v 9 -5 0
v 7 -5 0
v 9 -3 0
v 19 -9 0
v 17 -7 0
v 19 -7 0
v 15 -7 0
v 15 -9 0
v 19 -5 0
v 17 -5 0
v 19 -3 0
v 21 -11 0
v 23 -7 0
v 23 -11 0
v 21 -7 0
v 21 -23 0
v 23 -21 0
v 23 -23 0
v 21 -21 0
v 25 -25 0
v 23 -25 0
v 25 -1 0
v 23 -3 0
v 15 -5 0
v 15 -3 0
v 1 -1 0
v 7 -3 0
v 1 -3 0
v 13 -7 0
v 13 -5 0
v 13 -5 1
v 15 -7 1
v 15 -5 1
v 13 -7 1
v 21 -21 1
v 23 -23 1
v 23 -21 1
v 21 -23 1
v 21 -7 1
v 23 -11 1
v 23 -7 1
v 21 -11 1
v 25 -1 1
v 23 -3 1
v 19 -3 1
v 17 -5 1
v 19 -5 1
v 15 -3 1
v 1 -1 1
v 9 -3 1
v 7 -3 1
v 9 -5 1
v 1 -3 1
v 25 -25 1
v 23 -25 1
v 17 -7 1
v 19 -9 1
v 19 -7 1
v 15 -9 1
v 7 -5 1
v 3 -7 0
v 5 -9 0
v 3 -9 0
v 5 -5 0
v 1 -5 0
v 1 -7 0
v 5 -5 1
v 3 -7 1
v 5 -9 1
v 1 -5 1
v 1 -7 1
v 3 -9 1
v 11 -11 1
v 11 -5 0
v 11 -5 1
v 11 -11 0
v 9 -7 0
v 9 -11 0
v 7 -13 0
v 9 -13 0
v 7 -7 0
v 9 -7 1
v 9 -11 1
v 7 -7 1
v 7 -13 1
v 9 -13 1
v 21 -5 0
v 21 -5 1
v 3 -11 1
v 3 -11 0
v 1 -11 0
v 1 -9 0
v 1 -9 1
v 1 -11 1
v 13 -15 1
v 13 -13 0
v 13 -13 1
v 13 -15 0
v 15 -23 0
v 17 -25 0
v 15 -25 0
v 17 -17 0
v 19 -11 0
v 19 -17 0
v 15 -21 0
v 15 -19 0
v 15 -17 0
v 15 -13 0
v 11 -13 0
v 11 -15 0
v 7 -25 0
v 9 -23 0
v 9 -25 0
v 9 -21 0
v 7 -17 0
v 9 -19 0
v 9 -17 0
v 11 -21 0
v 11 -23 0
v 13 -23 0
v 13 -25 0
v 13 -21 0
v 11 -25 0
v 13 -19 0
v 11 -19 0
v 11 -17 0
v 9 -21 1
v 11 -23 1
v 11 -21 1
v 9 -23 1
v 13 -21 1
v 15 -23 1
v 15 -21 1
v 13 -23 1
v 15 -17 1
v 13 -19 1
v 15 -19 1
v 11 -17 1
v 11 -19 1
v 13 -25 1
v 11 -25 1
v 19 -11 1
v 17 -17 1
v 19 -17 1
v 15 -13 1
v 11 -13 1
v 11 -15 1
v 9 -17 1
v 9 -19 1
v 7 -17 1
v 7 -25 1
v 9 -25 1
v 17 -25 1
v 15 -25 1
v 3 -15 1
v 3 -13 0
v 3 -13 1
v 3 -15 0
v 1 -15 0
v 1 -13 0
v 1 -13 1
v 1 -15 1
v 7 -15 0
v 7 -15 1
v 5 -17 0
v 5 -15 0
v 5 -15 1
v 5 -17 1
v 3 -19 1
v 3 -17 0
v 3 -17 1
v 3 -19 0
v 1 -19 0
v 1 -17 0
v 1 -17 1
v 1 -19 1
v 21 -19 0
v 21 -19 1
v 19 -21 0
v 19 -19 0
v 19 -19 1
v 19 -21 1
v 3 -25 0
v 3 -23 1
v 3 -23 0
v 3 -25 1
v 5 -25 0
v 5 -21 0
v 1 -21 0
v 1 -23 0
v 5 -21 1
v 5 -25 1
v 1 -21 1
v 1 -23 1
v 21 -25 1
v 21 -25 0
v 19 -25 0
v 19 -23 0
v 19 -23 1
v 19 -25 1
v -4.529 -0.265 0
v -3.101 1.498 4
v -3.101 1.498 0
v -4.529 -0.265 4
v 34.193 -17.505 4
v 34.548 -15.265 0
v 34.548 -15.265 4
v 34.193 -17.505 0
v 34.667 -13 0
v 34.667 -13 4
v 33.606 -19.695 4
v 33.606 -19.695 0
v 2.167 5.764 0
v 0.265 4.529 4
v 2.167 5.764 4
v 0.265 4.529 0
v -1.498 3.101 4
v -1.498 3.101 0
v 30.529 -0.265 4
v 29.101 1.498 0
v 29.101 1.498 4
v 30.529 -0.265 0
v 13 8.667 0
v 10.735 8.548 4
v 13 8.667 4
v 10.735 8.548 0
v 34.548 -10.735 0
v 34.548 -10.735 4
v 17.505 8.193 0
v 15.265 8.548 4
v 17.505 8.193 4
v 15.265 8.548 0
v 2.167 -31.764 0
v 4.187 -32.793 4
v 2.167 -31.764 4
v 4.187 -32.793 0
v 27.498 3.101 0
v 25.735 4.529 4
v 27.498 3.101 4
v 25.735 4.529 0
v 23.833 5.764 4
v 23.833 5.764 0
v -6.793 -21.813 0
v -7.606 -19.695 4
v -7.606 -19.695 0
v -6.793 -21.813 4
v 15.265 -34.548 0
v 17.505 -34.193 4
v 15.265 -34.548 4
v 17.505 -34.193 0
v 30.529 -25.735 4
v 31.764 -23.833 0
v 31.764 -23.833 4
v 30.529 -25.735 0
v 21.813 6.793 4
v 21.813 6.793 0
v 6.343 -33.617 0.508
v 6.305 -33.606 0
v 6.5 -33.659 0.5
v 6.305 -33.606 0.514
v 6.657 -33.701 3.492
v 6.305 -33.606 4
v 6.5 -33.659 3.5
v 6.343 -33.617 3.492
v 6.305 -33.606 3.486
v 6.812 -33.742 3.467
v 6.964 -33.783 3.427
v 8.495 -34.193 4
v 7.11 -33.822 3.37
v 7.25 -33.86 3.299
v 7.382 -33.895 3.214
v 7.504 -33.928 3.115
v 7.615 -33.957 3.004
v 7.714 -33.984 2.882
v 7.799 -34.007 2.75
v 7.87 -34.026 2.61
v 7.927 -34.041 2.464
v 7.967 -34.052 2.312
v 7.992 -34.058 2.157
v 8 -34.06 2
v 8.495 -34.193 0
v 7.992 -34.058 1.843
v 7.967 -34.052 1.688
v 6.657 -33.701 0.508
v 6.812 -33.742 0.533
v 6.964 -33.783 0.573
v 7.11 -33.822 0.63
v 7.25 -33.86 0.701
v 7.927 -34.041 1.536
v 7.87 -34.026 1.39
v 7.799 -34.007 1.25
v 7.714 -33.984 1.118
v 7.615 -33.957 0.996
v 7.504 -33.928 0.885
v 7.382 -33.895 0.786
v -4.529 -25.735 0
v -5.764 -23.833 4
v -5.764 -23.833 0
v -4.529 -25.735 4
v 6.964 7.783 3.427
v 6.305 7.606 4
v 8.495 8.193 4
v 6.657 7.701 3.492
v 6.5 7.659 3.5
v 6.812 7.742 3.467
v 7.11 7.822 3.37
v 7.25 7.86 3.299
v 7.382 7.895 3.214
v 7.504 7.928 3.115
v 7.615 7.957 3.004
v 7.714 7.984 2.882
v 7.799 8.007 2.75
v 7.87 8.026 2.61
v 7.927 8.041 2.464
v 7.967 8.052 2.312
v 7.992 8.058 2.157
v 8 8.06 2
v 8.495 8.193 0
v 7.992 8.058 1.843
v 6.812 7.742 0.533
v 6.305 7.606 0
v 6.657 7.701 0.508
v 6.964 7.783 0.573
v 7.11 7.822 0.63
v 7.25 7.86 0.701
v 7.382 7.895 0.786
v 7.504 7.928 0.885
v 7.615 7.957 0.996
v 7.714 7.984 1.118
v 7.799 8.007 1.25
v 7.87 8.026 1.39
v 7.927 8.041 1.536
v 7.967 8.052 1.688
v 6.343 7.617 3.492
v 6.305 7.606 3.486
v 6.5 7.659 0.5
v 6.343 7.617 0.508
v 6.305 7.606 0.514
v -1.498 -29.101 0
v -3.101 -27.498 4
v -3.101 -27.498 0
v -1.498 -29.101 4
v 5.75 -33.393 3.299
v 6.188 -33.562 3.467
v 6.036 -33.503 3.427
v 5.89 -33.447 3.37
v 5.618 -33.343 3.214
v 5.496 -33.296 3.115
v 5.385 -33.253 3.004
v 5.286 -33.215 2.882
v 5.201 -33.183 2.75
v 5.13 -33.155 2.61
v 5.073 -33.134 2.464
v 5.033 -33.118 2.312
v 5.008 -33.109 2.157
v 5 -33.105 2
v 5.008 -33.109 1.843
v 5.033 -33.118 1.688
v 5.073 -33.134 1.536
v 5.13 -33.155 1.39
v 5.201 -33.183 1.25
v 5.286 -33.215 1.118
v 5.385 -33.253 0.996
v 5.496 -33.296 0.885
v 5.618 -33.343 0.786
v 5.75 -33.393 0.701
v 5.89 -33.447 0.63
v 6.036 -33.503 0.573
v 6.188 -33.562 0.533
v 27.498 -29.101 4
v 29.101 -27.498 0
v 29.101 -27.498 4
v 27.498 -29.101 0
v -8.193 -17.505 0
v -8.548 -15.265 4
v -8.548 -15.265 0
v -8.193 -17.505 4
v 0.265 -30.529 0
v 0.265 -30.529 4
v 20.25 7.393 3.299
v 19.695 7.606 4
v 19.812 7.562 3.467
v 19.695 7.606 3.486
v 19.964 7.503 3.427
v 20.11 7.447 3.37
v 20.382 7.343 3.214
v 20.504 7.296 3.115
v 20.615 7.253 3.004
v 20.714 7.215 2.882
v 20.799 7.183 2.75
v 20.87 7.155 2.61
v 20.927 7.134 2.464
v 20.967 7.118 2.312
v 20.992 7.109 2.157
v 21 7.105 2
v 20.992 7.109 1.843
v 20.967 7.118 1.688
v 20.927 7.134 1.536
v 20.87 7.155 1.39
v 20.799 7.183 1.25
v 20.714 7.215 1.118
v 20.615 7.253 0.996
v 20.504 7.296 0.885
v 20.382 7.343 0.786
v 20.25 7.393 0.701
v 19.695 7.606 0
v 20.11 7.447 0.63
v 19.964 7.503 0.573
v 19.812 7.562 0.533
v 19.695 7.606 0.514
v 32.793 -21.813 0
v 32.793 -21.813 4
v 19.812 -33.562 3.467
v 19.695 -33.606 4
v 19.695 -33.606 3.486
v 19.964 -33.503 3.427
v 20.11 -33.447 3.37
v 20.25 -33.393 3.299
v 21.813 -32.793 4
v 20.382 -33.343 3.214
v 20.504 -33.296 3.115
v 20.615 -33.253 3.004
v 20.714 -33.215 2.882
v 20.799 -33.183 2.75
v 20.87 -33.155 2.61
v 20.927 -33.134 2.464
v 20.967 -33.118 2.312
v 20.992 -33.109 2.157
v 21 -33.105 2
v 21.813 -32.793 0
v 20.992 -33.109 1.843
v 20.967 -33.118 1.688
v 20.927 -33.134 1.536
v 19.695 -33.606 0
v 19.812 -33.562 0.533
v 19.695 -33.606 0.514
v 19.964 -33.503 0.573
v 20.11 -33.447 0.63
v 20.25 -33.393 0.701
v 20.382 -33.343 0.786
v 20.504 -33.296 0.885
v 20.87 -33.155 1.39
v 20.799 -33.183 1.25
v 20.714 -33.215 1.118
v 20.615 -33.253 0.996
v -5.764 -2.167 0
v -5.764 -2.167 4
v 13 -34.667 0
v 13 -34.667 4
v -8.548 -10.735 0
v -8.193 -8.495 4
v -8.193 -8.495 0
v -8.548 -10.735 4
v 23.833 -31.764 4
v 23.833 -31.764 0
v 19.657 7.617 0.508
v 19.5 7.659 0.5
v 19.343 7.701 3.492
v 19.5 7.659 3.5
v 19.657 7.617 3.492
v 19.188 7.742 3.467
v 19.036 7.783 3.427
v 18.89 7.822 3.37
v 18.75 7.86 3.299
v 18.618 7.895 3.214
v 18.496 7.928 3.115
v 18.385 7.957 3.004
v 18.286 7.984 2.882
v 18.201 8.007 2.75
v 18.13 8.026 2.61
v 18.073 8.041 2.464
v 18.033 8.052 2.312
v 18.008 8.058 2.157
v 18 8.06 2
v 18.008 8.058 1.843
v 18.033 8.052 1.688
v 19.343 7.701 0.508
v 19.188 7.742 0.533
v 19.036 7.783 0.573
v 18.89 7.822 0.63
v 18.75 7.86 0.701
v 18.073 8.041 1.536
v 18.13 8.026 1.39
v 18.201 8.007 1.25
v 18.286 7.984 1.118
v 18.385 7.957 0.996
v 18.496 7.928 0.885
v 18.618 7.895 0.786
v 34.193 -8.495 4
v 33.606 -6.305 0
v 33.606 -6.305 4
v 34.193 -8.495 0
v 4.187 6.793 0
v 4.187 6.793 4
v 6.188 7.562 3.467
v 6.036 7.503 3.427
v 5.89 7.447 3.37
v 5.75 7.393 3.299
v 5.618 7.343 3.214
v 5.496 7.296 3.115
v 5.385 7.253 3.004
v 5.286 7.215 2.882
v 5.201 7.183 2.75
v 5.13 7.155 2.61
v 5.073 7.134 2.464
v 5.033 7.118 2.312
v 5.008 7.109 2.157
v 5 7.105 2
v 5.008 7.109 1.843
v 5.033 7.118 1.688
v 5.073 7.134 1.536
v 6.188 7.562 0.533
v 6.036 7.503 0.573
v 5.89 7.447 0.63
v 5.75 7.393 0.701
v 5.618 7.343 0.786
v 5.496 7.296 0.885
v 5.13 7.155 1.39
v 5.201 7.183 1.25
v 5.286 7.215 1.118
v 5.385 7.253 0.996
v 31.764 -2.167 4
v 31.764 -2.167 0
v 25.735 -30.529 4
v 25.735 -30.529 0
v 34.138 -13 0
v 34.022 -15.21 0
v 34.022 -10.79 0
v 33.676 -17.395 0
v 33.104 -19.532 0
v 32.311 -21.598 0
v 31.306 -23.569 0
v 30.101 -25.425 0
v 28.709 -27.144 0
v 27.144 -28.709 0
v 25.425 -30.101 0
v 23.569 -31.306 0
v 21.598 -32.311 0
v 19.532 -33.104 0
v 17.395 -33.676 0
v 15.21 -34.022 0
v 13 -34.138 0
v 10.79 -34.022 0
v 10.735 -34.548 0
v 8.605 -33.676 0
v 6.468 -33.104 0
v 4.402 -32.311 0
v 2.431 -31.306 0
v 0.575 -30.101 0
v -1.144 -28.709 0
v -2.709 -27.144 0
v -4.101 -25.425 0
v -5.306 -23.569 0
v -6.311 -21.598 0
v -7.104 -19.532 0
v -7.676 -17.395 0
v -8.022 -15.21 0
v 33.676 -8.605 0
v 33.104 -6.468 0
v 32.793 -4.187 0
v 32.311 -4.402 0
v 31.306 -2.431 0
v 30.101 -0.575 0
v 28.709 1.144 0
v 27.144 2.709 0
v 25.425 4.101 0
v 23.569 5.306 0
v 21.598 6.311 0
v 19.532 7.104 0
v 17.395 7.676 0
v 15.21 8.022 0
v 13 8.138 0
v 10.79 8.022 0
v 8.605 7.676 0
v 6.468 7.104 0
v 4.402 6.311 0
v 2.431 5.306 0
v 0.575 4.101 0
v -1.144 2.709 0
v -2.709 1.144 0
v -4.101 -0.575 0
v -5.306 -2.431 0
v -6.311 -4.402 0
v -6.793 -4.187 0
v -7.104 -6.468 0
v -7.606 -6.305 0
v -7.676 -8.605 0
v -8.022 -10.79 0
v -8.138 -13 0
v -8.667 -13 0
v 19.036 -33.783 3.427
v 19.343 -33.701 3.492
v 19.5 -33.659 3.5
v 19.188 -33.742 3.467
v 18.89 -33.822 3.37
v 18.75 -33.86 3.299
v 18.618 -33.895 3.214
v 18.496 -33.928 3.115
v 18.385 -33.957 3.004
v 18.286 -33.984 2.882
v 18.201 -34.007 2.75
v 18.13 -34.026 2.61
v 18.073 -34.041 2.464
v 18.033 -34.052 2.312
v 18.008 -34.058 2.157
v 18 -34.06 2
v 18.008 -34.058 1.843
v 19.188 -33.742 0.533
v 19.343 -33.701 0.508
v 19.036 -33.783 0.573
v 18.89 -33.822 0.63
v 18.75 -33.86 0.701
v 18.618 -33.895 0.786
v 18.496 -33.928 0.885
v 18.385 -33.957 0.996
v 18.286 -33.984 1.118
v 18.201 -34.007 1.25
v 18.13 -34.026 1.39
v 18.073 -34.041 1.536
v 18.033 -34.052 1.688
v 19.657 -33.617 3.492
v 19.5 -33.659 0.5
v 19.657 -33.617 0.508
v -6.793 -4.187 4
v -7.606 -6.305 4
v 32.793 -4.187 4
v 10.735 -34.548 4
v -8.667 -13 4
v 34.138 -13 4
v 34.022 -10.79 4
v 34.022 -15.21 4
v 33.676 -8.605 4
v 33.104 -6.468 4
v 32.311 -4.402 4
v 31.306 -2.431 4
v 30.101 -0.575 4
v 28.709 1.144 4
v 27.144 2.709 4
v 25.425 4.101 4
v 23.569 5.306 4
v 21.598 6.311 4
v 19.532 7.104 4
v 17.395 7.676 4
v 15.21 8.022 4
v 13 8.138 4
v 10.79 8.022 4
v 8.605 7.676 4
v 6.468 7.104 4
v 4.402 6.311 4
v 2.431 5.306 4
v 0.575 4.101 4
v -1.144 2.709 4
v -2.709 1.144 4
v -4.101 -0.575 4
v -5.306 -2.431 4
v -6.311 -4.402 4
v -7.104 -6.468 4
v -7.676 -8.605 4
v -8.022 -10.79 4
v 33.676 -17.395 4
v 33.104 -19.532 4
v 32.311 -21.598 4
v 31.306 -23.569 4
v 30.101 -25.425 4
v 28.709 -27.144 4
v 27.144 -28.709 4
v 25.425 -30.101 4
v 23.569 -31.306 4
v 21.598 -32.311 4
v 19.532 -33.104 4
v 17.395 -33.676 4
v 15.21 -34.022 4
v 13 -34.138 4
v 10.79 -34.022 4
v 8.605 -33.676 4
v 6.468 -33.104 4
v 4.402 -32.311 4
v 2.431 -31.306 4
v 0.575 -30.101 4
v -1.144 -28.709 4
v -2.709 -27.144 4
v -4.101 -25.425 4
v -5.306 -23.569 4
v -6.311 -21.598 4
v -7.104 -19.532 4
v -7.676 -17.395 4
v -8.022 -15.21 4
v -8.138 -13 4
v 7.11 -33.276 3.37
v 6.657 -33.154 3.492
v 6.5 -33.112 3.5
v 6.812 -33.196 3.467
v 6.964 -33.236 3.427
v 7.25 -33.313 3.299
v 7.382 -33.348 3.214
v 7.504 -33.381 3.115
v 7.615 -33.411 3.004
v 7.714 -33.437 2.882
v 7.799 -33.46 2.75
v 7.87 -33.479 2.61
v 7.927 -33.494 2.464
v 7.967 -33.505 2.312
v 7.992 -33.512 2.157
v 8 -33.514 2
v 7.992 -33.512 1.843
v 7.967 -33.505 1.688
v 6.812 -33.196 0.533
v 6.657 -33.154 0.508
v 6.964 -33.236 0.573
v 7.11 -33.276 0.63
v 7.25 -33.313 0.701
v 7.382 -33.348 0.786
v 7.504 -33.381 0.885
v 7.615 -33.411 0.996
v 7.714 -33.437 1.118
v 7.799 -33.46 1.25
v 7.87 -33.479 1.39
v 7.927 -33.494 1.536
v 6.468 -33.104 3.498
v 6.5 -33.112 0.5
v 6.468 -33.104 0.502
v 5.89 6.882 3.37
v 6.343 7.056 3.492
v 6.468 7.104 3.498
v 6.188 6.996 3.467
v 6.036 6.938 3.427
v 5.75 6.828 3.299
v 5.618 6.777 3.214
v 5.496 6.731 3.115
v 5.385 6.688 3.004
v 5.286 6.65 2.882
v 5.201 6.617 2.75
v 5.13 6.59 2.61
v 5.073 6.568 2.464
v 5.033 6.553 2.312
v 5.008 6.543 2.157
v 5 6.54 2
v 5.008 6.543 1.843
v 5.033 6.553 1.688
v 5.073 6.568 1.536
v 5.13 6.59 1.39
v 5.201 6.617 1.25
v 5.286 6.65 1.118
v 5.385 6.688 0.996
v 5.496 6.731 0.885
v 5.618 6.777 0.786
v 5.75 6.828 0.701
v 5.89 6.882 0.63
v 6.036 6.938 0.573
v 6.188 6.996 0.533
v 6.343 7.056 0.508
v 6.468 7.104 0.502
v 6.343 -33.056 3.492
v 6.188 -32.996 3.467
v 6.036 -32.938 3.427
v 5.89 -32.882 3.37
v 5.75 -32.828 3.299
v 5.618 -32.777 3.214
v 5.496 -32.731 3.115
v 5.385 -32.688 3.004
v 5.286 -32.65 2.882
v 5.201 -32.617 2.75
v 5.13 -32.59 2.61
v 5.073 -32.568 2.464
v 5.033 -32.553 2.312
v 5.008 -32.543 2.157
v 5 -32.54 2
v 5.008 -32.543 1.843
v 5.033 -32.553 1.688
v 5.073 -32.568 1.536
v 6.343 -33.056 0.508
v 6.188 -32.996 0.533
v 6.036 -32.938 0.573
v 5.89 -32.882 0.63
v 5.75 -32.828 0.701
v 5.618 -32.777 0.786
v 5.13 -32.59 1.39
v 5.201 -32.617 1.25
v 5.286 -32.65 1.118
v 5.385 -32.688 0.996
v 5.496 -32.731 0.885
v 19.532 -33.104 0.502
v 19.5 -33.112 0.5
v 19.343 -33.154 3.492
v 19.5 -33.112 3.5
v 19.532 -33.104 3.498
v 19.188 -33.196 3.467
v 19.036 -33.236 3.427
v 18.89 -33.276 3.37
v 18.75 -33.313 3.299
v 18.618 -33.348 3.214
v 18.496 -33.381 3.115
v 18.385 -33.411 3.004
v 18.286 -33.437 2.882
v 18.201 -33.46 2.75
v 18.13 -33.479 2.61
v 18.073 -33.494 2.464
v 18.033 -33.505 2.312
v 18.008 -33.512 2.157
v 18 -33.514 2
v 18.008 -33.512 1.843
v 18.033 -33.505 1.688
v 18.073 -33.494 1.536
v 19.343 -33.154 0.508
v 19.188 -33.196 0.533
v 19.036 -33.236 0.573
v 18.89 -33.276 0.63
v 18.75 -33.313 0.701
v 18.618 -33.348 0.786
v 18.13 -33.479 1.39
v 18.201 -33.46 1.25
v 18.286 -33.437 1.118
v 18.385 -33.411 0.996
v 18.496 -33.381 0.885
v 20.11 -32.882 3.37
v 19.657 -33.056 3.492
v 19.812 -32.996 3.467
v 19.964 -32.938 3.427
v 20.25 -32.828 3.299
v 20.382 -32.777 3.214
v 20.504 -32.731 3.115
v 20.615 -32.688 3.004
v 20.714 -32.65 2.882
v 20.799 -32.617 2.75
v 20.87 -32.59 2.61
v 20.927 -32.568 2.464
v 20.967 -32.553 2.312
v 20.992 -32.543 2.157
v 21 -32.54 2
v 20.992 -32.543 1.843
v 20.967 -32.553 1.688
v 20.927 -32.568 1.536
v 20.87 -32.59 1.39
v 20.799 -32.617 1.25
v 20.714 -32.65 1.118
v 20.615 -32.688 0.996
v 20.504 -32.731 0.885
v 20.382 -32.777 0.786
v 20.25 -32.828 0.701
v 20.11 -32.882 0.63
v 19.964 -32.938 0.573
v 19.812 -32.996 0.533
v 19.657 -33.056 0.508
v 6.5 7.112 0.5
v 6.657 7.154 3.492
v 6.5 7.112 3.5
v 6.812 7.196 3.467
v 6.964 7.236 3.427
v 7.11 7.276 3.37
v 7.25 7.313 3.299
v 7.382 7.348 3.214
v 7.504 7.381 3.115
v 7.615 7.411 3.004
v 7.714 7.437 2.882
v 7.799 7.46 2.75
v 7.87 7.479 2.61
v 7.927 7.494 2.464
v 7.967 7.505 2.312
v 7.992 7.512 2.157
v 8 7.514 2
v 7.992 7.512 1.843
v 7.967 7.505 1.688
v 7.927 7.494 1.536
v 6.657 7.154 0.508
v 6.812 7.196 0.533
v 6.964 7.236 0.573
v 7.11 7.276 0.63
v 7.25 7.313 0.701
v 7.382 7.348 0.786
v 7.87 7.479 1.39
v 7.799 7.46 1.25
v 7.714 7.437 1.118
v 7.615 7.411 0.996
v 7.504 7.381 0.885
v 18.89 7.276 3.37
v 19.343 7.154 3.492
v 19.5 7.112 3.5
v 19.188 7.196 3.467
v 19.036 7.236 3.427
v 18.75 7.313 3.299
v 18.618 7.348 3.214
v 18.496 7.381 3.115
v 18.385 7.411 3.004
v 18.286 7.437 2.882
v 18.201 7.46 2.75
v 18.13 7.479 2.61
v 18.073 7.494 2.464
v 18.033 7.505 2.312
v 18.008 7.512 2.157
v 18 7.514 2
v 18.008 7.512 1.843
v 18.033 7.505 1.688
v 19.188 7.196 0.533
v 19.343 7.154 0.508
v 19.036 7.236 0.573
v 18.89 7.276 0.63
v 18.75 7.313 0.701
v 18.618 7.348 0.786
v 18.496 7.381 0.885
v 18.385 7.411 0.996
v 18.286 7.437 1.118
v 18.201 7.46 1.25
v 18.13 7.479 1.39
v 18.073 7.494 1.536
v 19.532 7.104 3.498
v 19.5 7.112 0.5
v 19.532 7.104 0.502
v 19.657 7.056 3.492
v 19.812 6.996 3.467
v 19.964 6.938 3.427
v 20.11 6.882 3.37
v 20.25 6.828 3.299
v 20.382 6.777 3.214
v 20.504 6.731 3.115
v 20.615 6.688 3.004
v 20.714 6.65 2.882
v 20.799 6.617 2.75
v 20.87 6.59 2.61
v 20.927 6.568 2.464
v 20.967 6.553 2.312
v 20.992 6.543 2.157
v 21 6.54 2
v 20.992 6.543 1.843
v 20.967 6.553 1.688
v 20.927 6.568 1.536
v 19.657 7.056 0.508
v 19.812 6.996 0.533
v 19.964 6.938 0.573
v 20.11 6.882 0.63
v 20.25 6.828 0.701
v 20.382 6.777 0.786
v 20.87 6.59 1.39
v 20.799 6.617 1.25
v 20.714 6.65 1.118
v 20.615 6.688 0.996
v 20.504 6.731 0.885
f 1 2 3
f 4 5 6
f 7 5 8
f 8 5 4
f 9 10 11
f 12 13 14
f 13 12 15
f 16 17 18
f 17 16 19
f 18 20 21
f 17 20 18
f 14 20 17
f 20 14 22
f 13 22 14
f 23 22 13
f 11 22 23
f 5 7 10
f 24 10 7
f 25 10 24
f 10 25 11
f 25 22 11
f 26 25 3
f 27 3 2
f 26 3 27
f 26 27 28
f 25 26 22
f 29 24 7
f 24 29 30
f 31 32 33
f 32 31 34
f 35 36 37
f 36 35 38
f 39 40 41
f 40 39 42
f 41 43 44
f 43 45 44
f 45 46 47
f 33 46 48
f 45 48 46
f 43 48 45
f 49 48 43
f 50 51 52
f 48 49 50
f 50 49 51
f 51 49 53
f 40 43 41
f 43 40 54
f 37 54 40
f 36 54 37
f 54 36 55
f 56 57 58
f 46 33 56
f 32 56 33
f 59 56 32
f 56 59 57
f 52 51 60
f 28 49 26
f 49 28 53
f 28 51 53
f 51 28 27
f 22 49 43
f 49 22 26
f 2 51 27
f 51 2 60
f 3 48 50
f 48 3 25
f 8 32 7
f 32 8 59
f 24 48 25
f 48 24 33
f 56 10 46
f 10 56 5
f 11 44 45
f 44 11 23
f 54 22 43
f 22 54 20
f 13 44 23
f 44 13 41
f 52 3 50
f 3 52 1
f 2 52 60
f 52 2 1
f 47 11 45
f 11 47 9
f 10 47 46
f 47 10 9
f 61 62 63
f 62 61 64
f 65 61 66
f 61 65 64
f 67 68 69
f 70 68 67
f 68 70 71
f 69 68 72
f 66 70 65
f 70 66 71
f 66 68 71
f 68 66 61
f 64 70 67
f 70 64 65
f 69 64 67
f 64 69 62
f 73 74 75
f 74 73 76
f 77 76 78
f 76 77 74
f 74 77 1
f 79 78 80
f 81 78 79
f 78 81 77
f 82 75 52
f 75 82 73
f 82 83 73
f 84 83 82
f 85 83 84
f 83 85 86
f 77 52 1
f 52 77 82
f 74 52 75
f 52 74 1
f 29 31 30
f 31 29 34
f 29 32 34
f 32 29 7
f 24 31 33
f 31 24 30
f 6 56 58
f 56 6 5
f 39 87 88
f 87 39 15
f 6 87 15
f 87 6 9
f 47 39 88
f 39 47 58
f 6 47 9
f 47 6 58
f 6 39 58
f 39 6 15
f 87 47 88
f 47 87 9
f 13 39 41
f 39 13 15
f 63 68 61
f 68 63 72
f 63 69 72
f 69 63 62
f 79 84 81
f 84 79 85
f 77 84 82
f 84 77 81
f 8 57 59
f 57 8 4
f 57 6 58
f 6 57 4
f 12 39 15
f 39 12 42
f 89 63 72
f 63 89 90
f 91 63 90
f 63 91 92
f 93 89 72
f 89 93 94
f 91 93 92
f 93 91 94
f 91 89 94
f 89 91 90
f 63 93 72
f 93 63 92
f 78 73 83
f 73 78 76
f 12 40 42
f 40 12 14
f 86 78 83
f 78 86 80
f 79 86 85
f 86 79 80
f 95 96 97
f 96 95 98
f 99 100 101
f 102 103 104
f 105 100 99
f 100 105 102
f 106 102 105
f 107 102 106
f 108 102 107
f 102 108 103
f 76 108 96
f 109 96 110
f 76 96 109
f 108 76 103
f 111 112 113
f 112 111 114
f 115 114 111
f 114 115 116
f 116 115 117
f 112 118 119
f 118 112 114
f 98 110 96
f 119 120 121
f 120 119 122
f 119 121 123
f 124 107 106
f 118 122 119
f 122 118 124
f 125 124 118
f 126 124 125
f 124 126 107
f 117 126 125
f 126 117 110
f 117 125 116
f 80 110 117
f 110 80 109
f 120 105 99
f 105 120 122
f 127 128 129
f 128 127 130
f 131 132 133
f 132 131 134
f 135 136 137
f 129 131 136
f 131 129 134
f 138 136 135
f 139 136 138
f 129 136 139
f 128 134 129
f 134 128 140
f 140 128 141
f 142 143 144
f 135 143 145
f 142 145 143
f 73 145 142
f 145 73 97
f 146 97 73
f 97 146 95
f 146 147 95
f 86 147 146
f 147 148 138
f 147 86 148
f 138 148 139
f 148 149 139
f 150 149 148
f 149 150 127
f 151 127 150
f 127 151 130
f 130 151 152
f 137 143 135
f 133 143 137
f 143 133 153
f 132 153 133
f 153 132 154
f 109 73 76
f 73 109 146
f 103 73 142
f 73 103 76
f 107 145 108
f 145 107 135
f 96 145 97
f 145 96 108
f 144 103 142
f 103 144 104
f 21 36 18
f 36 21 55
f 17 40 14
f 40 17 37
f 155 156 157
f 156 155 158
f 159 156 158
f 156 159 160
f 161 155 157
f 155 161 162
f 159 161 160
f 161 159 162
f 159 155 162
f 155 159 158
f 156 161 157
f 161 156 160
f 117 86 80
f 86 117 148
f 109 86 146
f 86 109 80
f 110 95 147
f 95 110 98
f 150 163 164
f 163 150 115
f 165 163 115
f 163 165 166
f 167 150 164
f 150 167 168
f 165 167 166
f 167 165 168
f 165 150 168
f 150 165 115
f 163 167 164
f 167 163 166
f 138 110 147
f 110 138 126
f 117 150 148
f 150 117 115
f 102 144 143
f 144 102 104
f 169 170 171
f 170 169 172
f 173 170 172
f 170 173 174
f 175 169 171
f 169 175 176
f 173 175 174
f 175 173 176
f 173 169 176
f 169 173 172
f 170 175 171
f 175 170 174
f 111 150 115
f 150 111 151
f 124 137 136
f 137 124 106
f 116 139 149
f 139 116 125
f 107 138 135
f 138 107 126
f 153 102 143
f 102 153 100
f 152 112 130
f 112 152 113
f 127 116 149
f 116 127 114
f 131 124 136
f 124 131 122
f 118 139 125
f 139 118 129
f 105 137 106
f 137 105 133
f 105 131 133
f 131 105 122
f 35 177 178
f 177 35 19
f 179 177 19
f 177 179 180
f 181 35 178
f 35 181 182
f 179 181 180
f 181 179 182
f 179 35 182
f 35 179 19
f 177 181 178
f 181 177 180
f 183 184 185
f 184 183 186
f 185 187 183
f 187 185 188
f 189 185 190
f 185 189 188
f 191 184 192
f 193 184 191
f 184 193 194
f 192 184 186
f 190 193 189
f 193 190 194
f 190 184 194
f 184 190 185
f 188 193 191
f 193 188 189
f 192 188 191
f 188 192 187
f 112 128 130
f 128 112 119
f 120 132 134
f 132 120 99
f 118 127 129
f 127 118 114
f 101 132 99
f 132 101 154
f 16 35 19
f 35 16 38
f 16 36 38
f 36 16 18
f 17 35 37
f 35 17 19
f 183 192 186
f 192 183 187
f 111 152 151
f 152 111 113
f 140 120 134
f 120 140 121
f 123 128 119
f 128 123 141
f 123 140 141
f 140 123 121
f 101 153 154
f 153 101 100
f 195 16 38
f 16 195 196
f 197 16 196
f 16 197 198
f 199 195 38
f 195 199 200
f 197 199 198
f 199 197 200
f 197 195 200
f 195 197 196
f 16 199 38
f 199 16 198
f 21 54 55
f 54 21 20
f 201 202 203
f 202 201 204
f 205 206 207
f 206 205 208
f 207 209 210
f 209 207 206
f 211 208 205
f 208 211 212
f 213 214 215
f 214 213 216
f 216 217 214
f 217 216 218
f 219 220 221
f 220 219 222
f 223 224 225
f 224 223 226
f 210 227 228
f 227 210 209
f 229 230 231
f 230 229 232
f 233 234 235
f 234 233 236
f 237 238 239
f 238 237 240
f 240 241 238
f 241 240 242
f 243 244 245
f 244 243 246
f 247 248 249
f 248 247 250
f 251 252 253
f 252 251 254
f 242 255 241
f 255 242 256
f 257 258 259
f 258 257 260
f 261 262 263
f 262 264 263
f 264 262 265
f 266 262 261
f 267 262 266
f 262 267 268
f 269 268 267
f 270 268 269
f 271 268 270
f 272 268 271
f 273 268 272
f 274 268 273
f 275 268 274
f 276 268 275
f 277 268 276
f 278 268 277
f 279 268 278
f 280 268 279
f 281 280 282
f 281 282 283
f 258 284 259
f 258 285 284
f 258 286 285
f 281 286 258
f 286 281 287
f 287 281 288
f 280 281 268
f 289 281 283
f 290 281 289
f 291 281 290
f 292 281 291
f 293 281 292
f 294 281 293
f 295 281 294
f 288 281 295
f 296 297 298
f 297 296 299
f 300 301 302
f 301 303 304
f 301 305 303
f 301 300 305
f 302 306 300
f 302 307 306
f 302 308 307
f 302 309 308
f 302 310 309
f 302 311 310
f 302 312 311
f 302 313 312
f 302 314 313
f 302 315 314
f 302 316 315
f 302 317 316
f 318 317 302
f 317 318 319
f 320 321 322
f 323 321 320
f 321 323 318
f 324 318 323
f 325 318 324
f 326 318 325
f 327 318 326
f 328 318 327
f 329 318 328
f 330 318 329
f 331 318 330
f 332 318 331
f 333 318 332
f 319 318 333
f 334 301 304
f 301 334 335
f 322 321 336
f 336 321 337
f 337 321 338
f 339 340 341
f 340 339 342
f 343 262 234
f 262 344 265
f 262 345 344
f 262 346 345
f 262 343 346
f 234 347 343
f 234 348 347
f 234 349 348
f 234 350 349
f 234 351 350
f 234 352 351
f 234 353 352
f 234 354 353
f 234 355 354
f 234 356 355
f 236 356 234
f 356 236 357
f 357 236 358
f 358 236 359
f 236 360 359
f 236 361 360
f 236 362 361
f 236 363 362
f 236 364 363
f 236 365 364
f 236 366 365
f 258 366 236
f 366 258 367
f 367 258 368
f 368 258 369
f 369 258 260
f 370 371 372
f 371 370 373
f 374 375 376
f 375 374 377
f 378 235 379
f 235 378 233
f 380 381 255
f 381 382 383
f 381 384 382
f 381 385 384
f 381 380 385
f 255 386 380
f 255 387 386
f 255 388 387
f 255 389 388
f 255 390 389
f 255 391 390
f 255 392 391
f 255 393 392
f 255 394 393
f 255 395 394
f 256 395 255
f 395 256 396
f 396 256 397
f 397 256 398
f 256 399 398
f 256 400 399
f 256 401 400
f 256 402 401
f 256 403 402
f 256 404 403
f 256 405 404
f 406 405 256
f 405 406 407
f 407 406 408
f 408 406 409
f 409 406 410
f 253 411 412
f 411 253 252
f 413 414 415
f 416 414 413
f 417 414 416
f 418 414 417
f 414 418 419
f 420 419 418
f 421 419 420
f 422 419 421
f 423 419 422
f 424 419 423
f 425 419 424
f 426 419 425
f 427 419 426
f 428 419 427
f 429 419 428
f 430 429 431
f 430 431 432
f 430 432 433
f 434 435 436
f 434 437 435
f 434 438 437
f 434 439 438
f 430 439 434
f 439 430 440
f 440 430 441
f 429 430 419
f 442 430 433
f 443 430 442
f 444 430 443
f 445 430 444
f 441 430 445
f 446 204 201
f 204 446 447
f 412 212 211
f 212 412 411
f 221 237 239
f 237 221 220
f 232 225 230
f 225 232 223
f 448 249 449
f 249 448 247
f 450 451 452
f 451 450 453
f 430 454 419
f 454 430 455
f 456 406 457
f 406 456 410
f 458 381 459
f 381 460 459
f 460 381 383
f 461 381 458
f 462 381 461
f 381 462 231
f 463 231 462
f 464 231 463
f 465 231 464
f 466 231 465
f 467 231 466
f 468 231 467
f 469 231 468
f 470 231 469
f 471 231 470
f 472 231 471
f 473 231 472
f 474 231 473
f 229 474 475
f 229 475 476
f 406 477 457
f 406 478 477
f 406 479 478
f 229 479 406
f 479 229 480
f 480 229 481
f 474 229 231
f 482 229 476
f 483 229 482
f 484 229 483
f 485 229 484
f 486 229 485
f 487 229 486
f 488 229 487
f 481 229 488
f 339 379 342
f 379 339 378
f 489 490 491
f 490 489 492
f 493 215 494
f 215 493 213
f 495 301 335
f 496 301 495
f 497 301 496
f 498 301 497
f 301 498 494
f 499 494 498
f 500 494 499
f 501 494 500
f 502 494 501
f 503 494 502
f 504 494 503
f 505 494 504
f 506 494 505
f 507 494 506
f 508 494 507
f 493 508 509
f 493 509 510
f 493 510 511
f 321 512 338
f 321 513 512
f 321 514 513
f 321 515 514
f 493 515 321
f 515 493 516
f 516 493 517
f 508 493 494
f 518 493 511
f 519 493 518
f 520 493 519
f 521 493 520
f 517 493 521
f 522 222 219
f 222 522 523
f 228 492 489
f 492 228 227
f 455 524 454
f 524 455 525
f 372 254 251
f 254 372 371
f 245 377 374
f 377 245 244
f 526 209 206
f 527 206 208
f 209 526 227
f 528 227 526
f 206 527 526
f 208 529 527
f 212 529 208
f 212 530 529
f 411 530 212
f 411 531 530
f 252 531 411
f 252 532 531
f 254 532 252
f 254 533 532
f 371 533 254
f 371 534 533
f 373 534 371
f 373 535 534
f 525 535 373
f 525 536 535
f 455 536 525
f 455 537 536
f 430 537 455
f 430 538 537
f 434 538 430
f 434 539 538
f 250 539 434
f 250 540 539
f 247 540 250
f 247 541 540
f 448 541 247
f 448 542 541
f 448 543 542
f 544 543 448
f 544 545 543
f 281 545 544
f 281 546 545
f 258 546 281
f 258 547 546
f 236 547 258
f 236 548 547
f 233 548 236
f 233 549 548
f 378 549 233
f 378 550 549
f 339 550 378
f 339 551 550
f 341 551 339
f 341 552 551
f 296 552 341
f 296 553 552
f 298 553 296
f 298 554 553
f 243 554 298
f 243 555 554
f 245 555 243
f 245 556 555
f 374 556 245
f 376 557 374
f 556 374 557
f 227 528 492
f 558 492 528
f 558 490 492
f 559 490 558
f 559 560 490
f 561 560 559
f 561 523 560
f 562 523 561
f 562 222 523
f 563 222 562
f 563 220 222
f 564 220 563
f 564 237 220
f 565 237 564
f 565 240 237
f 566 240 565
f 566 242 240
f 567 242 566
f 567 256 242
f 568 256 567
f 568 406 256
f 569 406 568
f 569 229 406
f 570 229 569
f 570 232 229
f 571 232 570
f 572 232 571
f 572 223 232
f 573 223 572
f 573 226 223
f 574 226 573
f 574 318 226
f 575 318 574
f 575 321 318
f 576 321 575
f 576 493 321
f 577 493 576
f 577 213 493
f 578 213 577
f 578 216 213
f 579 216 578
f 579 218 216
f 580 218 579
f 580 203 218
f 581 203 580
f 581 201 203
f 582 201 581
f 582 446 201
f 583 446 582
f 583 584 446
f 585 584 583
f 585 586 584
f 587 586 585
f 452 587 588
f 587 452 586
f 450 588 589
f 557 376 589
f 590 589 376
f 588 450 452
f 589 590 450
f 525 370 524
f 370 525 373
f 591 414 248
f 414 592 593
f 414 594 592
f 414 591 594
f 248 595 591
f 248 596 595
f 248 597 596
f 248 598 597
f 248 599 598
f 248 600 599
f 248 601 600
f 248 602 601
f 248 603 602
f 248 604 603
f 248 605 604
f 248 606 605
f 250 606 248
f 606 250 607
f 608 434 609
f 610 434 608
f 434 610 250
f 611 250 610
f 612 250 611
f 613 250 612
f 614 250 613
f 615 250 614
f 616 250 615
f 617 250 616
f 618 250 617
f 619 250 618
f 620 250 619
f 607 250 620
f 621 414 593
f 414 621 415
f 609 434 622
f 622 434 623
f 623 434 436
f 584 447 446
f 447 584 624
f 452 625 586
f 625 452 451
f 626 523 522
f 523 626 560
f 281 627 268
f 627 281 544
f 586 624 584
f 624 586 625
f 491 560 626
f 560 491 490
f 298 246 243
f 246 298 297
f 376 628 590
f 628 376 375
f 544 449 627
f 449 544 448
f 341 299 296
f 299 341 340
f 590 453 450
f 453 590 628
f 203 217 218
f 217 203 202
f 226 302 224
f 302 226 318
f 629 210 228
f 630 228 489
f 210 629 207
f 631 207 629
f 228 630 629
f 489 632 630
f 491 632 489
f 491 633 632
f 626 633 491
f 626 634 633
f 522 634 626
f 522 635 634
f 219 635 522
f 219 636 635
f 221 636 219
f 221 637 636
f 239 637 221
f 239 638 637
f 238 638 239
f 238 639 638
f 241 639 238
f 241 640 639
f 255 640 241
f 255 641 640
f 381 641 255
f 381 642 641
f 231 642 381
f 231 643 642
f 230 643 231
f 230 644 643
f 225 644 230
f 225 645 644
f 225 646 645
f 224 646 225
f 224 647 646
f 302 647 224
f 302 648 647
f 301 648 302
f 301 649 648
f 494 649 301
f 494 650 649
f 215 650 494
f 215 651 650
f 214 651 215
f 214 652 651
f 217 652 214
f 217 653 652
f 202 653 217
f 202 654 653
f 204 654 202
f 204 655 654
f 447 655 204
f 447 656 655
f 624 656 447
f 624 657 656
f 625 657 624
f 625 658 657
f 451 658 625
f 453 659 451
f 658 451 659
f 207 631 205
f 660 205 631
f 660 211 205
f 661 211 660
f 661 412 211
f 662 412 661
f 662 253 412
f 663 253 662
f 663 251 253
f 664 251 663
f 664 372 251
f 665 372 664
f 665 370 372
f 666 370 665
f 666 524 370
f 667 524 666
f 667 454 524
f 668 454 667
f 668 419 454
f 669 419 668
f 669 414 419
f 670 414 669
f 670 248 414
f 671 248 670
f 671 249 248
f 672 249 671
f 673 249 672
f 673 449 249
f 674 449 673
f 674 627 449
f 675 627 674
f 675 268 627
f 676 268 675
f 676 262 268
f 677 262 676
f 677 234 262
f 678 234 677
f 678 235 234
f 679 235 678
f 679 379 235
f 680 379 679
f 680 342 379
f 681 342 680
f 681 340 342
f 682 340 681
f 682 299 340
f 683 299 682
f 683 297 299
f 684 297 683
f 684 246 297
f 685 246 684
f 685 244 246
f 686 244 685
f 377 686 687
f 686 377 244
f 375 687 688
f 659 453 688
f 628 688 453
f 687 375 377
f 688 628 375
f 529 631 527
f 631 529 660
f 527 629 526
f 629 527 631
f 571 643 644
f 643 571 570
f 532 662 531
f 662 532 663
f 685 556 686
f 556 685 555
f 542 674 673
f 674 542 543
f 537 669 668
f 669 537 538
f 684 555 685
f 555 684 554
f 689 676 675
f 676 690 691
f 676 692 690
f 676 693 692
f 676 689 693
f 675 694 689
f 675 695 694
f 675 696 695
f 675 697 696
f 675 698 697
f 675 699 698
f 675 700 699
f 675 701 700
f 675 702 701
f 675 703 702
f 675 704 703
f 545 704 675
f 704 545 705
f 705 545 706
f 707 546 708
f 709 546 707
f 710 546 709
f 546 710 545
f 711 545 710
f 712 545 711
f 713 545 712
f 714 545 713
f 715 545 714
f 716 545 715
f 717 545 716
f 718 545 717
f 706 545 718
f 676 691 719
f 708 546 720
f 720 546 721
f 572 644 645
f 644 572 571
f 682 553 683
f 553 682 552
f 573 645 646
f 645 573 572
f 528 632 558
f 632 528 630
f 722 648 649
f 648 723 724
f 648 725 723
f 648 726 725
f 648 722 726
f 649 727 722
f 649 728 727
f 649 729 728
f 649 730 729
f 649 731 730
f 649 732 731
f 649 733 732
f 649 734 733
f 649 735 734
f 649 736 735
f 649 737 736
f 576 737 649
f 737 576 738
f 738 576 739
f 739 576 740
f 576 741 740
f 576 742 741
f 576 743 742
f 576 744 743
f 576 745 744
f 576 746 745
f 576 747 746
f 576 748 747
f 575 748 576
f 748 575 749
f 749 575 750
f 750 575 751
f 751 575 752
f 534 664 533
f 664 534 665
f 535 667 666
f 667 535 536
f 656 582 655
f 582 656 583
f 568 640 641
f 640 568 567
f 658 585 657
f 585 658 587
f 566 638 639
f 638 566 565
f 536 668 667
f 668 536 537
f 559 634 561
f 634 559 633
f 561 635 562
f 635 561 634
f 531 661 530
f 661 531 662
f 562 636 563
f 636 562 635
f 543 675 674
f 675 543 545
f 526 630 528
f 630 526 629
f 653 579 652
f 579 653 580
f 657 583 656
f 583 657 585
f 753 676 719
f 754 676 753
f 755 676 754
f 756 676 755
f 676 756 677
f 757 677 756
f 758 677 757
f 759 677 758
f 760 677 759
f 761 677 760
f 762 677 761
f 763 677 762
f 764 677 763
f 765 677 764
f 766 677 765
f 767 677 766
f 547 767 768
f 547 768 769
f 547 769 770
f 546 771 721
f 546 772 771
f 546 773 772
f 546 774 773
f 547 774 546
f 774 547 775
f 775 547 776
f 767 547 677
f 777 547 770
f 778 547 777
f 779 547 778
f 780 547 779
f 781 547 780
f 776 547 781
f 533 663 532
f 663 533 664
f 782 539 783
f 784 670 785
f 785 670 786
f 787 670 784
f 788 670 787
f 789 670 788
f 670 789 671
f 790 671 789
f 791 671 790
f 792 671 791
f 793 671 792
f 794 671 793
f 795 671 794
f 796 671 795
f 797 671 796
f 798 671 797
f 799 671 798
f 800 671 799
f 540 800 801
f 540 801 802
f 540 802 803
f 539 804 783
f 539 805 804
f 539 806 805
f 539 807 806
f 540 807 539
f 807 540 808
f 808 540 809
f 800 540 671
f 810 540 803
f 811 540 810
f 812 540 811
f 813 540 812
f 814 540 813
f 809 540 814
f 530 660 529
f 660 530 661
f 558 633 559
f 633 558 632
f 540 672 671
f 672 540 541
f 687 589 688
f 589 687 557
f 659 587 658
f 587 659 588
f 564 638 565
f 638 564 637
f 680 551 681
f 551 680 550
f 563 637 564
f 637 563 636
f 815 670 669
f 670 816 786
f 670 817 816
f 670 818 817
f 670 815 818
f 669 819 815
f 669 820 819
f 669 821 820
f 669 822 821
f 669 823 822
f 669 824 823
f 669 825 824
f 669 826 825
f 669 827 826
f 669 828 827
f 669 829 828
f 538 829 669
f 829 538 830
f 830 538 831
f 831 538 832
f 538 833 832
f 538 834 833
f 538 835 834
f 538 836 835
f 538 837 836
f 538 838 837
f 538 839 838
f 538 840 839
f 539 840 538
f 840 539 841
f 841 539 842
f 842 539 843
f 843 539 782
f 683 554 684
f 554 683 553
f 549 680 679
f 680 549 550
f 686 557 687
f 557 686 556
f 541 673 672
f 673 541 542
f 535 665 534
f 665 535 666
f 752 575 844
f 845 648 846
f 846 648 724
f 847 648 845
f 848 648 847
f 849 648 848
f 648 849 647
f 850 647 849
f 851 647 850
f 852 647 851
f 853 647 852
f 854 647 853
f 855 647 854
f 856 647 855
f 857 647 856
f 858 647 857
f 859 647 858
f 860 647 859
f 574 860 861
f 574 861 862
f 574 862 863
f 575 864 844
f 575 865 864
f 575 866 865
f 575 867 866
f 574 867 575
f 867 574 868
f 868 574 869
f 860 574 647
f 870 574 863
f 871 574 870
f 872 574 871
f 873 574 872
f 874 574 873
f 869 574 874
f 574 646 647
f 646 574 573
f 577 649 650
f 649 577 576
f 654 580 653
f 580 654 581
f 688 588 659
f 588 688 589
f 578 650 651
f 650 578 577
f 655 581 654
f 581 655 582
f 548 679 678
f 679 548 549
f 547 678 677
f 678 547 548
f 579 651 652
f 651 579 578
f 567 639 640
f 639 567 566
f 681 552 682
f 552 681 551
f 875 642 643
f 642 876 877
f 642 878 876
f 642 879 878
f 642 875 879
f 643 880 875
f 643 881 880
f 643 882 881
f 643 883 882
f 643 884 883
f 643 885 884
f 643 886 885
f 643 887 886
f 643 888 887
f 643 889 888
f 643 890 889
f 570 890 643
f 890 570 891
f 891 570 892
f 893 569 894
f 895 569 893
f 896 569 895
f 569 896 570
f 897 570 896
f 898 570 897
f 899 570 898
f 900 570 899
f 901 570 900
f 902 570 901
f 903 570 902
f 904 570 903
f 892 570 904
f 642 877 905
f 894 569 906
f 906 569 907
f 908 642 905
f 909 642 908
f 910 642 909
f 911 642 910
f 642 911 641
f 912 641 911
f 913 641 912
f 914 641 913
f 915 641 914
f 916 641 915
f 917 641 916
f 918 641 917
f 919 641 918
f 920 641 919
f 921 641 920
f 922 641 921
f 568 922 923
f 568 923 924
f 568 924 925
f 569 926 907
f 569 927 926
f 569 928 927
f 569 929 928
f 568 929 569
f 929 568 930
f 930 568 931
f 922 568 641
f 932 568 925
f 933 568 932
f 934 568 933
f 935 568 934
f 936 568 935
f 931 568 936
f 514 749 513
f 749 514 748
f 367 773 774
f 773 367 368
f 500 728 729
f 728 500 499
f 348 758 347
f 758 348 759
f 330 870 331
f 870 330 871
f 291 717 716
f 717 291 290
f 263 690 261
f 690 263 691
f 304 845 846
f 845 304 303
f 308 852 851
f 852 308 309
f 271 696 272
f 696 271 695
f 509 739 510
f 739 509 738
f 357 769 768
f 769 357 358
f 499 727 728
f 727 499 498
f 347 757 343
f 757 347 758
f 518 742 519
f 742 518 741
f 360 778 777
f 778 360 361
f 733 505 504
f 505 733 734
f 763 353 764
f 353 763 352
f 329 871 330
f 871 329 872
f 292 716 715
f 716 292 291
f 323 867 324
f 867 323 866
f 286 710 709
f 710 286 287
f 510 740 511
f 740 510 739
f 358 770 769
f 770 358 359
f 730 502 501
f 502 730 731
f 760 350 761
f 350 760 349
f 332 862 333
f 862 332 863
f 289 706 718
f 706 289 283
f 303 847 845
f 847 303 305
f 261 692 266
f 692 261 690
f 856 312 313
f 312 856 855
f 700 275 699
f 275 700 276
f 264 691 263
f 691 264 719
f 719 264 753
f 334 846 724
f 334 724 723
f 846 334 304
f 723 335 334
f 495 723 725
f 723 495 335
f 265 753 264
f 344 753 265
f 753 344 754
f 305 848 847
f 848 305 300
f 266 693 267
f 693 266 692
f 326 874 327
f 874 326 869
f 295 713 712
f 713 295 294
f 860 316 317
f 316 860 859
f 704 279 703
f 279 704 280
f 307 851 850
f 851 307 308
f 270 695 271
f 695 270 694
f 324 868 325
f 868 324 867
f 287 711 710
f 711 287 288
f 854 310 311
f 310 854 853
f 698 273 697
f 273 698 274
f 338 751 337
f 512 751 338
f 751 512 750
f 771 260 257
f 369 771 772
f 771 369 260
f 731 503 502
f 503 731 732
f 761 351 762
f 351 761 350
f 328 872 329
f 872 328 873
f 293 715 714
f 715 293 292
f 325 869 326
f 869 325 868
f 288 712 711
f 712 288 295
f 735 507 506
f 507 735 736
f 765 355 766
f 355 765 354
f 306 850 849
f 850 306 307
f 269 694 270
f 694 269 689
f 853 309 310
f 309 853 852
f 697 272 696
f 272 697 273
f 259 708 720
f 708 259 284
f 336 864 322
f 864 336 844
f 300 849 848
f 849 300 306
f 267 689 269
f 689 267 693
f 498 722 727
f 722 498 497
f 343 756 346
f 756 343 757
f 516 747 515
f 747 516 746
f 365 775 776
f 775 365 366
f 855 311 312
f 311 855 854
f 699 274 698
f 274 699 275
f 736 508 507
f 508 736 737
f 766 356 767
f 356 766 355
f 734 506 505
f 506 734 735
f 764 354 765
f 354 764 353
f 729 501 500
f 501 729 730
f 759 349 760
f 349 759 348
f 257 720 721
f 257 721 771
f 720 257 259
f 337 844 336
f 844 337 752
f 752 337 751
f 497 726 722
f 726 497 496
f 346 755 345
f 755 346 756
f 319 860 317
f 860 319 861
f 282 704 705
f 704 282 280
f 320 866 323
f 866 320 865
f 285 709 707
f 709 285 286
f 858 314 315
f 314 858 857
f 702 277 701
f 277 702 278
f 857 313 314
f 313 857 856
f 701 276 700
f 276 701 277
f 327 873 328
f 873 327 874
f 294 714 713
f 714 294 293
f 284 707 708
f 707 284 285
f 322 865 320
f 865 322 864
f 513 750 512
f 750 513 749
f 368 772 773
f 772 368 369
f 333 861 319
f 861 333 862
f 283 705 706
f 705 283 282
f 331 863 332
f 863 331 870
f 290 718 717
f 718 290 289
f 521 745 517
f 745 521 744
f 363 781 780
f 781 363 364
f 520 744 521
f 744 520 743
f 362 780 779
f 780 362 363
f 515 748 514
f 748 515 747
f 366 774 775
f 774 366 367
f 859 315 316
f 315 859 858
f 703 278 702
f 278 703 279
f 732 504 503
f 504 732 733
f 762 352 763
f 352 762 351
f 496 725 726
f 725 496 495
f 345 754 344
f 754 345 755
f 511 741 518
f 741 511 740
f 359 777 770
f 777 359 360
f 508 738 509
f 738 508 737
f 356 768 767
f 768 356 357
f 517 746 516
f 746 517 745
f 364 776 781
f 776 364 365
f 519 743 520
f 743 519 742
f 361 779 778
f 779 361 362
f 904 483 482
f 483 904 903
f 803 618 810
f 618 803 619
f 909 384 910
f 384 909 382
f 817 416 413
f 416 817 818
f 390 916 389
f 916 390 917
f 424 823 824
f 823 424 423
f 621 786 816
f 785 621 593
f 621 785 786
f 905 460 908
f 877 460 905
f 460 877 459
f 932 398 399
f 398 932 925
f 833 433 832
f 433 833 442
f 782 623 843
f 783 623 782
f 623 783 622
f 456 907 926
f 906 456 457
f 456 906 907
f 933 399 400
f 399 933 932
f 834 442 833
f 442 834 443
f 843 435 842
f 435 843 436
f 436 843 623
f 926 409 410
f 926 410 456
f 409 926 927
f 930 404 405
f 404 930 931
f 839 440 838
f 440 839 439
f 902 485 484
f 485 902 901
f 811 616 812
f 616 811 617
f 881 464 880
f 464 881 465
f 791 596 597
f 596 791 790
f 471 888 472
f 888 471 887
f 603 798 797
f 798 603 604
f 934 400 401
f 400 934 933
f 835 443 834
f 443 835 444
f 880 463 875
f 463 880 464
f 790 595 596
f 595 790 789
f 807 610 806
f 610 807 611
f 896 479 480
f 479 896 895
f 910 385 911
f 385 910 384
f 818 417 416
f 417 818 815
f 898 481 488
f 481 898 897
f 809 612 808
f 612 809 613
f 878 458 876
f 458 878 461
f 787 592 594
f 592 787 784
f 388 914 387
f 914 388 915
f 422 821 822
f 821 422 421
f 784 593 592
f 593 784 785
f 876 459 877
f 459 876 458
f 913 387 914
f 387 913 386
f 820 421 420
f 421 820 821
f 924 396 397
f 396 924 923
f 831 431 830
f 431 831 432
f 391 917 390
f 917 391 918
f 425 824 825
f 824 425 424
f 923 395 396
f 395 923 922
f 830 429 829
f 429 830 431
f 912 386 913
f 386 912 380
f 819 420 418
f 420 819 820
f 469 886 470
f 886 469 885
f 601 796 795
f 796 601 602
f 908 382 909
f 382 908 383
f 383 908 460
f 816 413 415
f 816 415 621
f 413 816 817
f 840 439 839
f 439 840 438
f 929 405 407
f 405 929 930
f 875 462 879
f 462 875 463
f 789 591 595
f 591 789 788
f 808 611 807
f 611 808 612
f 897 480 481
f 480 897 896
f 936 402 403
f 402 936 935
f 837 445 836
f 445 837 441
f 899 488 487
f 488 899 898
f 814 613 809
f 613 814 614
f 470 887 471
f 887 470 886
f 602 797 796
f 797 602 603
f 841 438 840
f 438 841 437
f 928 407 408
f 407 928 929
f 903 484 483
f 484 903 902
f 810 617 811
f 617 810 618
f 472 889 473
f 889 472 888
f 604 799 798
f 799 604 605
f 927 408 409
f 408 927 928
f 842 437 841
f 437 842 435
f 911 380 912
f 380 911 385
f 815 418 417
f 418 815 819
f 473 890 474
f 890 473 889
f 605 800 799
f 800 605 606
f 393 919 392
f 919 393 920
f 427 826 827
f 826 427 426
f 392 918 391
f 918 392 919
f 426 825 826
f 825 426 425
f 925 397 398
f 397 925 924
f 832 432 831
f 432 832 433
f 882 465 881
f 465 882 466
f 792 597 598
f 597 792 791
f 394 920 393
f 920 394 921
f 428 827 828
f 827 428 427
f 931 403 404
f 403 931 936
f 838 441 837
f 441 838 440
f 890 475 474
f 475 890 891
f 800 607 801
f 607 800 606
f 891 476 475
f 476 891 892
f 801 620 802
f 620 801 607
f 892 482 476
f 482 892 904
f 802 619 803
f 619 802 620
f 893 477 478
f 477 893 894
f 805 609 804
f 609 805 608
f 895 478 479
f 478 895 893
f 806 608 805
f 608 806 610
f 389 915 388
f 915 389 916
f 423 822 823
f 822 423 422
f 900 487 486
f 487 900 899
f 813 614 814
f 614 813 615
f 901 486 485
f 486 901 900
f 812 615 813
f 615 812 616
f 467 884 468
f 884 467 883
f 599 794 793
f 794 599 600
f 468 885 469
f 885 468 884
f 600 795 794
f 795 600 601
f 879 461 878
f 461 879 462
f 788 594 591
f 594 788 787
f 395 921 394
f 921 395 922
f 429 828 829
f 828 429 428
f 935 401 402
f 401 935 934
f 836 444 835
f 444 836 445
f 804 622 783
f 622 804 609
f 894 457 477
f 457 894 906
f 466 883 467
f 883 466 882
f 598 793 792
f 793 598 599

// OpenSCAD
rotate([180,0,0])translate([0,0,-0.5]){
translate([2,2,0])  cube(size = [2,2,1], center=true);
translate([4,2,0])  cube(size = [2,2,1], center=true);
translate([6,2,0])  cube(size = [2,2,1], center=true);
translate([8,2,0])  cube(size = [2,2,1], center=true);
translate([10,2,0])  cube(size = [2,2,1], center=true);
translate([12,2,0])  cube(size = [2,2,1], center=true);
translate([14,2,0])  cube(size = [2,2,1], center=true);
translate([16,2,0])  cube(size = [2,2,1], center=true);
translate([18,2,0])  cube(size = [2,2,1], center=true);
translate([20,2,0])  cube(size = [2,2,1], center=true);
translate([22,2,0])  cube(size = [2,2,1], center=true);
translate([24,2,0])  cube(size = [2,2,1], center=true);
translate([24,2,0])  cube(size = [2,2,1], center=true);
translate([24,2,0])  cube(size = [2,2,1], center=true);
translate([24,2,0])  cube(size = [2,2,1], center=true);
translate([8,4,0])  cube(size = [2,2,1], center=true);
translate([8,4,0])  cube(size = [2,2,1], center=true);
translate([8,4,0])  cube(size = [2,2,1], center=true);
translate([8,4,0])  cube(size = [2,2,1], center=true);
translate([16,4,0])  cube(size = [2,2,1], center=true);
translate([18,4,0])  cube(size = [2,2,1], center=true);
translate([18,4,0])  cube(size = [2,2,1], center=true);
translate([18,4,0])  cube(size = [2,2,1], center=true);
translate([24,4,0])  cube(size = [2,2,1], center=true);
translate([2,6,0])  cube(size = [2,2,1], center=true);
translate([4,6,0])  cube(size = [2,2,1], center=true);
translate([4,6,0])  cube(size = [2,2,1], center=true);
translate([4,6,0])  cube(size = [2,2,1], center=true);
translate([10,6,0])  cube(size = [2,2,1], center=true);
translate([10,6,0])  cube(size = [2,2,1], center=true);
translate([14,6,0])  cube(size = [2,2,1], center=true);
translate([16,6,0])  cube(size = [2,2,1], center=true);
translate([16,6,0])  cube(size = [2,2,1], center=true);
translate([20,6,0])  cube(size = [2,2,1], center=true);
translate([20,6,0])  cube(size = [2,2,1], center=true);
translate([24,6,0])  cube(size = [2,2,1], center=true);
translate([24,6,0])  cube(size = [2,2,1], center=true);
translate([4,8,0])  cube(size = [2,2,1], center=true);
translate([4,8,0])  cube(size = [2,2,1], center=true);
translate([8,8,0])  cube(size = [2,2,1], center=true);
translate([10,8,0])  cube(size = [2,2,1], center=true);
translate([10,8,0])  cube(size = [2,2,1], center=true);
translate([10,8,0])  cube(size = [2,2,1], center=true);
translate([16,8,0])  cube(size = [2,2,1], center=true);
translate([18,8,0])  cube(size = [2,2,1], center=true);
translate([18,8,0])  cube(size = [2,2,1], center=true);
translate([22,8,0])  cube(size = [2,2,1], center=true);
translate([24,8,0])  cube(size = [2,2,1], center=true);
translate([2,10,0])  cube(size = [2,2,1], center=true);
translate([2,10,0])  cube(size = [2,2,1], center=true);
translate([2,10,0])  cube(size = [2,2,1], center=true);
translate([8,10,0])  cube(size = [2,2,1], center=true);
translate([10,10,0])  cube(size = [2,2,1], center=true);
translate([10,10,0])  cube(size = [2,2,1], center=true);
translate([10,10,0])  cube(size = [2,2,1], center=true);
translate([10,10,0])  cube(size = [2,2,1], center=true);
translate([10,10,0])  cube(size = [2,2,1], center=true);
translate([10,10,0])  cube(size = [2,2,1], center=true);
translate([22,10,0])  cube(size = [2,2,1], center=true);
translate([24,10,0])  cube(size = [2,2,1], center=true);
translate([24,10,0])  cube(size = [2,2,1], center=true);
translate([24,10,0])  cube(size = [2,2,1], center=true);
translate([24,10,0])  cube(size = [2,2,1], center=true);
translate([8,12,0])  cube(size = [2,2,1], center=true);
translate([8,12,0])  cube(size = [2,2,1], center=true);
translate([12,12,0])  cube(size = [2,2,1], center=true);
translate([14,12,0])  cube(size = [2,2,1], center=true);
translate([16,12,0])  cube(size = [2,2,1], center=true);
translate([18,12,0])  cube(size = [2,2,1], center=true);
translate([18,12,0])  cube(size = [2,2,1], center=true);
translate([18,12,0])  cube(size = [2,2,1], center=true);
translate([24,12,0])  cube(size = [2,2,1], center=true);
translate([2,14,0])  cube(size = [2,2,1], center=true);
translate([2,14,0])  cube(size = [2,2,1], center=true);
translate([2,14,0])  cube(size = [2,2,1], center=true);
translate([2,14,0])  cube(size = [2,2,1], center=true);
translate([10,14,0])  cube(size = [2,2,1], center=true);
translate([12,14,0])  cube(size = [2,2,1], center=true);
translate([12,14,0])  cube(size = [2,2,1], center=true);
translate([16,14,0])  cube(size = [2,2,1], center=true);
translate([18,14,0])  cube(size = [2,2,1], center=true);
translate([18,14,0])  cube(size = [2,2,1], center=true);
translate([18,14,0])  cube(size = [2,2,1], center=true);
translate([24,14,0])  cube(size = [2,2,1], center=true);
translate([24,14,0])  cube(size = [2,2,1], center=true);
translate([24,14,0])  cube(size = [2,2,1], center=true);
translate([6,16,0])  cube(size = [2,2,1], center=true);
translate([6,16,0])  cube(size = [2,2,1], center=true);
translate([10,16,0])  cube(size = [2,2,1], center=true);
translate([10,16,0])  cube(size = [2,2,1], center=true);
translate([10,16,0])  cube(size = [2,2,1], center=true);
translate([16,16,0])  cube(size = [2,2,1], center=true);
translate([18,16,0])  cube(size = [2,2,1], center=true);
translate([18,16,0])  cube(size = [2,2,1], center=true);
translate([18,16,0])  cube(size = [2,2,1], center=true);
translate([24,16,0])  cube(size = [2,2,1], center=true);
translate([2,18,0])  cube(size = [2,2,1], center=true);
translate([2,18,0])  cube(size = [2,2,1], center=true);
translate([2,18,0])  cube(size = [2,2,1], center=true);
translate([8,18,0])  cube(size = [2,2,1], center=true);
translate([10,18,0])  cube(size = [2,2,1], center=true);
translate([12,18,0])  cube(size = [2,2,1], center=true);
translate([14,18,0])  cube(size = [2,2,1], center=true);
translate([16,18,0])  cube(size = [2,2,1], center=true);
translate([16,18,0])  cube(size = [2,2,1], center=true);
translate([16,18,0])  cube(size = [2,2,1], center=true);
translate([16,18,0])  cube(size = [2,2,1], center=true);
translate([24,18,0])  cube(size = [2,2,1], center=true);
translate([24,18,0])  cube(size = [2,2,1], center=true);
translate([24,18,0])  cube(size = [2,2,1], center=true);
translate([24,18,0])  cube(size = [2,2,1], center=true);
translate([8,20,0])  cube(size = [2,2,1], center=true);
translate([8,20,0])  cube(size = [2,2,1], center=true);
translate([12,20,0])  cube(size = [2,2,1], center=true);
translate([12,20,0])  cube(size = [2,2,1], center=true);
translate([16,20,0])  cube(size = [2,2,1], center=true);
translate([16,20,0])  cube(size = [2,2,1], center=true);
translate([20,20,0])  cube(size = [2,2,1], center=true);
translate([20,20,0])  cube(size = [2,2,1], center=true);
translate([24,20,0])  cube(size = [2,2,1], center=true);
translate([2,22,0])  cube(size = [2,2,1], center=true);
translate([4,22,0])  cube(size = [2,2,1], center=true);
translate([4,22,0])  cube(size = [2,2,1], center=true);
translate([8,22,0])  cube(size = [2,2,1], center=true);
translate([10,22,0])  cube(size = [2,2,1], center=true);
translate([12,22,0])  cube(size = [2,2,1], center=true);
translate([14,22,0])  cube(size = [2,2,1], center=true);
translate([16,22,0])  cube(size = [2,2,1], center=true);
translate([16,22,0])  cube(size = [2,2,1], center=true);
translate([16,22,0])  cube(size = [2,2,1], center=true);
translate([22,22,0])  cube(size = [2,2,1], center=true);
translate([24,22,0])  cube(size = [2,2,1], center=true);
translate([24,22,0])  cube(size = [2,2,1], center=true);
translate([4,24,0])  cube(size = [2,2,1], center=true);
translate([4,24,0])  cube(size = [2,2,1], center=true);
translate([8,24,0])  cube(size = [2,2,1], center=true);
translate([8,24,0])  cube(size = [2,2,1], center=true);
translate([12,24,0])  cube(size = [2,2,1], center=true);
translate([12,24,0])  cube(size = [2,2,1], center=true);
translate([16,24,0])  cube(size = [2,2,1], center=true);
translate([16,24,0])  cube(size = [2,2,1], center=true);
translate([20,24,0])  cube(size = [2,2,1], center=true);
translate([20,24,0])  cube(size = [2,2,1], center=true);
translate([24,24,0])  cube(size = [2,2,1], center=true);
}
rotate([180,0,0])difference(){translate([13,13,-2])  cylinder(r=21.6666666666667,h=4,$fn=60, center=true);
translate([13,13,-2])  cylinder(r=21.1382113821138,h=4,$fn=60, center=true);
rotate([90,90,0])translate([2,6.5,0])  cylinder(r=1.5,h=400, $fn=60, center=true);
rotate([90,90,0])translate([2,19.5,0])  cylinder(r=1.5,h=400, $fn=60, center=true);}
